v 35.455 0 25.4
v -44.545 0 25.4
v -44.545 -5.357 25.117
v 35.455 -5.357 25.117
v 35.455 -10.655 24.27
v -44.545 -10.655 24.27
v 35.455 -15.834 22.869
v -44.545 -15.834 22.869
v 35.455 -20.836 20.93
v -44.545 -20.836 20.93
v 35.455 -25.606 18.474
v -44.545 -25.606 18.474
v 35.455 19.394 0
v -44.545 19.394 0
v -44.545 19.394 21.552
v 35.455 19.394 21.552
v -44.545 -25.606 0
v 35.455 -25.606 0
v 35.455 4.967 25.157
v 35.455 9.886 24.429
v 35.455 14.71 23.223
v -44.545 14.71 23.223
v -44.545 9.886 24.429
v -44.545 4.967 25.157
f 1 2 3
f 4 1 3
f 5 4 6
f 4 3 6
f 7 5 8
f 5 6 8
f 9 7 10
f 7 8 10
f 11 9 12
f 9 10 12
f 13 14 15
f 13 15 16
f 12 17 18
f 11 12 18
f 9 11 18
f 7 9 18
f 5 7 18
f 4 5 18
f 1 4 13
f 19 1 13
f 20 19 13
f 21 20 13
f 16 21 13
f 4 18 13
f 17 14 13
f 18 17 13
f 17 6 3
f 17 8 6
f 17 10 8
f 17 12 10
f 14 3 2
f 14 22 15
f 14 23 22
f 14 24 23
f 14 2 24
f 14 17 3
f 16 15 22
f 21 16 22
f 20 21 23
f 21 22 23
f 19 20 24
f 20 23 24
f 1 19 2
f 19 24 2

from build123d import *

# Parameters (mm, degrees)
SKETCH1_W           = 80
SKETCH1_H           = 45
BOSS_EXTRUDE1_DEPTH = 25.4
CUT_EXTRUDE5_DEPTH  = 101.6


with BuildPart() as part:
    # Sketch1 → Boss-Extrude1 (new body)
    with BuildSketch(Plane.XY):
        with Locations((-4.545454545, -3.106060606)):
            Rectangle(SKETCH1_W, SKETCH1_H)
    extrude(amount=BOSS_EXTRUDE1_DEPTH)

    # Sketch2 → Cut-Extrude5 (cut)
    with BuildSketch(Plane.ZY.offset(44.545454545)):
        with BuildLine():
            ThreePointArc((21.552264214, 19.393939394), (24.428781954, 9.885974356), (25.4, 0))
            Line((25.4, 0), (25.4, 19.393939394))
            Line((25.4, 19.393939394), (21.552264214, 19.393939394))
        make_face()
        with BuildLine():
            Line((25.4, -25.606060606), (25.4, 0))
            ThreePointArc((25.4, 0), (23.638063736, -13.263042825), (18.474476182, -25.606060606))
            Line((18.474476182, -25.606060606), (25.4, -25.606060606))
        make_face()
    extrude(amount=-CUT_EXTRUDE5_DEPTH, mode=Mode.SUBTRACT)


solid = part.part
